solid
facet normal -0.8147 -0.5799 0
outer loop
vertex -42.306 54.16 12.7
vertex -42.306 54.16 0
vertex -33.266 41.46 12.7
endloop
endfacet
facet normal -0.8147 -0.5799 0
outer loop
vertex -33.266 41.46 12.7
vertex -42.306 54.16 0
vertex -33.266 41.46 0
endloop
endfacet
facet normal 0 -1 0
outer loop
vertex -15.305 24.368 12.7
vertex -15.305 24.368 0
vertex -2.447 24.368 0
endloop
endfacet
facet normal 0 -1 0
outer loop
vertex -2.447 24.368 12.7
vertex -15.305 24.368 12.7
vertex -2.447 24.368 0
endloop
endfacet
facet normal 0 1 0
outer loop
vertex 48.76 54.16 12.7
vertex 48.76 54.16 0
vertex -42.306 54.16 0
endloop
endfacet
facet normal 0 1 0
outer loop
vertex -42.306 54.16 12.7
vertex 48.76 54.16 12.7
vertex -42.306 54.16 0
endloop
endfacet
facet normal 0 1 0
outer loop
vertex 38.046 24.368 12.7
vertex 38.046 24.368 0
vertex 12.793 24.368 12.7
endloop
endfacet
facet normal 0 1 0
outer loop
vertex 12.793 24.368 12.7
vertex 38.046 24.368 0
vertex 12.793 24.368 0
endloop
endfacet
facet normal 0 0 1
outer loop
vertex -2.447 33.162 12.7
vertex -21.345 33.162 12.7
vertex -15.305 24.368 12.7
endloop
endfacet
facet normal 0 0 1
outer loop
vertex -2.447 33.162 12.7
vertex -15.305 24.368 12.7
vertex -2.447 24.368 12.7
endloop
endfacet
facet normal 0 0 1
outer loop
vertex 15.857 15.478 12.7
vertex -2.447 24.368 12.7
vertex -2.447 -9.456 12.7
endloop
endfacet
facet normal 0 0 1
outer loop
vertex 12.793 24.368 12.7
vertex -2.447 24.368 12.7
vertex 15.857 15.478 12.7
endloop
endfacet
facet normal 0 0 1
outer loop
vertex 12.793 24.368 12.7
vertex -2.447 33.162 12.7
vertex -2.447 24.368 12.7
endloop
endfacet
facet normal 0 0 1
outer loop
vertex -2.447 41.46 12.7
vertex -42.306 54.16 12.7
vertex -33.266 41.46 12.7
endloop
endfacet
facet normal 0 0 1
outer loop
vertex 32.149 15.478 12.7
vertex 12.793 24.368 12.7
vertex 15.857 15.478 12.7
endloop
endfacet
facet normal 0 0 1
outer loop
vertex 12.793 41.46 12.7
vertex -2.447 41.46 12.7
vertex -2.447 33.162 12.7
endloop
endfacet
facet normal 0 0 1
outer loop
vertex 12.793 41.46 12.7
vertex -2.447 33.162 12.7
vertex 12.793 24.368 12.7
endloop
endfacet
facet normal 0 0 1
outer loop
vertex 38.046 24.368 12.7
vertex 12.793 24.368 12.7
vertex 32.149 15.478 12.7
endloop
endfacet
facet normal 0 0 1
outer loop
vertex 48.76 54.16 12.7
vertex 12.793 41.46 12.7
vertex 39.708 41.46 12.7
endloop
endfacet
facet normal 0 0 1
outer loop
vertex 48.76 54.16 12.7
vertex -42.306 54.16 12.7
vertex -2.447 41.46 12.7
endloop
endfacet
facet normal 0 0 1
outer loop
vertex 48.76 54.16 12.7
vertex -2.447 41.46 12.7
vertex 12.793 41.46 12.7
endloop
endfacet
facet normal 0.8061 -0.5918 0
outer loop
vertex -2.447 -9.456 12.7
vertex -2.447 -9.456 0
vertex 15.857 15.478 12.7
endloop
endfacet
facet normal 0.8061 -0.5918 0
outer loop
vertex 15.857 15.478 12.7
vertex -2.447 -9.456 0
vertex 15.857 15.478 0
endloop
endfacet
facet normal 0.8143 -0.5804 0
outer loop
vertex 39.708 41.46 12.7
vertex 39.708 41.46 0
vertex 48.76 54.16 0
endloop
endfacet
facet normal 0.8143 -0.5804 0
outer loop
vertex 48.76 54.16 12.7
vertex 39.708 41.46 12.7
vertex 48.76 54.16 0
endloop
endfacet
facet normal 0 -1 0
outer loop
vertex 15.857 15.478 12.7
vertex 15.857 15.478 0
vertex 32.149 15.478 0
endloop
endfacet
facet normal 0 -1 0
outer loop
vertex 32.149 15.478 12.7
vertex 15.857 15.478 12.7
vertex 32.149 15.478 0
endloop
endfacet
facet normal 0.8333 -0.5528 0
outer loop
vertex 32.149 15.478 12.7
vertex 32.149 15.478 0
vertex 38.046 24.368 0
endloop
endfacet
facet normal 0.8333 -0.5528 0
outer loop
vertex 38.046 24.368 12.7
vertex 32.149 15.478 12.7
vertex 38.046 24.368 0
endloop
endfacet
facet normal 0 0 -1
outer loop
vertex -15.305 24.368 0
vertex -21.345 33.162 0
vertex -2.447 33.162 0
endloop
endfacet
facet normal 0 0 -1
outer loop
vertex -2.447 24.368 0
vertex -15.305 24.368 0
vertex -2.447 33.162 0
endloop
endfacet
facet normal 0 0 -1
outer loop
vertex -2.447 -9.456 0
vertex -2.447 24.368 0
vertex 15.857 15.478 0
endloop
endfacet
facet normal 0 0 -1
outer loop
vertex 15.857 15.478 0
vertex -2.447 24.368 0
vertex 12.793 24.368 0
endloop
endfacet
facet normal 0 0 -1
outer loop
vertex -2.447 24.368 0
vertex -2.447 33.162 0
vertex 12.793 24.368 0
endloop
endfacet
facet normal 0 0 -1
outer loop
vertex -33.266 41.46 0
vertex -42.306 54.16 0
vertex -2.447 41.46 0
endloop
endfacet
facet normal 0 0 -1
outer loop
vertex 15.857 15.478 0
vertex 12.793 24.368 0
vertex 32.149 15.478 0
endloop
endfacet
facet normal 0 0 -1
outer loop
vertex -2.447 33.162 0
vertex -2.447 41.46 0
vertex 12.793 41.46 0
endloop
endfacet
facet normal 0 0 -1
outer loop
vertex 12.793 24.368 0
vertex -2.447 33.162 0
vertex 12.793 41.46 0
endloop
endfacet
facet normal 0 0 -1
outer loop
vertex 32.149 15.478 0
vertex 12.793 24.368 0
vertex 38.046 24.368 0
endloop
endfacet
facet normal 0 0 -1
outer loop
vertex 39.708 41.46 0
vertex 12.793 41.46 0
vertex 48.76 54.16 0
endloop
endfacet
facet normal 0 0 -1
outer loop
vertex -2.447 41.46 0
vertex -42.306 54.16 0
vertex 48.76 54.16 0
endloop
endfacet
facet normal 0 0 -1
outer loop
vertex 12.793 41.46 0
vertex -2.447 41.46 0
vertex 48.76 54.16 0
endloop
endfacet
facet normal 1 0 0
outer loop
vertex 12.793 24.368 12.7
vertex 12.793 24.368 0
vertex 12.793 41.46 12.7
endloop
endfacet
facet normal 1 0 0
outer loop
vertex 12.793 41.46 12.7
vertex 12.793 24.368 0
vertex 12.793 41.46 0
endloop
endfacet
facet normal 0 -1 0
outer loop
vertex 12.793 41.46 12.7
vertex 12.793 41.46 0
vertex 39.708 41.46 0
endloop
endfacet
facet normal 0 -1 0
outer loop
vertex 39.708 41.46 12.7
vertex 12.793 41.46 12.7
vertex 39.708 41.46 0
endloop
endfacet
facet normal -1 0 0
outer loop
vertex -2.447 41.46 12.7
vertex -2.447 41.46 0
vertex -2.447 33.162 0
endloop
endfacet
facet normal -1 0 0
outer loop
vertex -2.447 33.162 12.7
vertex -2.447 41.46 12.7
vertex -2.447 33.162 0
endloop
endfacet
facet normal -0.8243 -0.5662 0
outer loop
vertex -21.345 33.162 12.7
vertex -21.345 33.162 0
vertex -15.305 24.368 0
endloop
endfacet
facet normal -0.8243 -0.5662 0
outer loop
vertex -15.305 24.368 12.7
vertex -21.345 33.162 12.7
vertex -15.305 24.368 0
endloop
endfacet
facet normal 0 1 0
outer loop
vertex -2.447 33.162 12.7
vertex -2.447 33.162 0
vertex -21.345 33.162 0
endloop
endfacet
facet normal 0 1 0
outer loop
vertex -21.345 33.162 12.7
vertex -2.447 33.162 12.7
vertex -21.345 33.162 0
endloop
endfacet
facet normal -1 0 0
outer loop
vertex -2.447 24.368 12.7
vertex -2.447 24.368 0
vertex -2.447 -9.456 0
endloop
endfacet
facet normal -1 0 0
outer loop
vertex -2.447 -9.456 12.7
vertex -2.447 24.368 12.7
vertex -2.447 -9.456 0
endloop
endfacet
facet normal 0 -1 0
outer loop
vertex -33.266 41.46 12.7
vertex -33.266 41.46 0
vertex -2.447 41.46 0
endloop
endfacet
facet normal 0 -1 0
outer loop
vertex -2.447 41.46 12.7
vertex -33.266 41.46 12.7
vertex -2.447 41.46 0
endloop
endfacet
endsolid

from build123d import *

# Parameters (mm, degrees)
F1_DEPTH = 12.7


with BuildPart() as f1:
    # F0 (on Top) → F1 (new body)
    with BuildSketch(Plane.XY):
        Polygon((48.759662, 54.159728), (-42.306267, 54.159728), (-33.266246, 41.459728), (-2.446738, 41.459728), (-2.446738, 33.161538), (-21.345066, 33.161538), (-15.30465, 24.368381), (-2.446738, 24.368381), (-2.446738, 0), (-2.446738, -9.455727), (15.856527, 15.478381), (22.471367, 15.478381), (32.149471, 15.478381), (38.04643, 24.368381), (12.793262, 24.368381), (12.793262, 41.459728), (39.707991, 41.459728), align=None)
    extrude(amount=F1_DEPTH)


solid = f1.part
